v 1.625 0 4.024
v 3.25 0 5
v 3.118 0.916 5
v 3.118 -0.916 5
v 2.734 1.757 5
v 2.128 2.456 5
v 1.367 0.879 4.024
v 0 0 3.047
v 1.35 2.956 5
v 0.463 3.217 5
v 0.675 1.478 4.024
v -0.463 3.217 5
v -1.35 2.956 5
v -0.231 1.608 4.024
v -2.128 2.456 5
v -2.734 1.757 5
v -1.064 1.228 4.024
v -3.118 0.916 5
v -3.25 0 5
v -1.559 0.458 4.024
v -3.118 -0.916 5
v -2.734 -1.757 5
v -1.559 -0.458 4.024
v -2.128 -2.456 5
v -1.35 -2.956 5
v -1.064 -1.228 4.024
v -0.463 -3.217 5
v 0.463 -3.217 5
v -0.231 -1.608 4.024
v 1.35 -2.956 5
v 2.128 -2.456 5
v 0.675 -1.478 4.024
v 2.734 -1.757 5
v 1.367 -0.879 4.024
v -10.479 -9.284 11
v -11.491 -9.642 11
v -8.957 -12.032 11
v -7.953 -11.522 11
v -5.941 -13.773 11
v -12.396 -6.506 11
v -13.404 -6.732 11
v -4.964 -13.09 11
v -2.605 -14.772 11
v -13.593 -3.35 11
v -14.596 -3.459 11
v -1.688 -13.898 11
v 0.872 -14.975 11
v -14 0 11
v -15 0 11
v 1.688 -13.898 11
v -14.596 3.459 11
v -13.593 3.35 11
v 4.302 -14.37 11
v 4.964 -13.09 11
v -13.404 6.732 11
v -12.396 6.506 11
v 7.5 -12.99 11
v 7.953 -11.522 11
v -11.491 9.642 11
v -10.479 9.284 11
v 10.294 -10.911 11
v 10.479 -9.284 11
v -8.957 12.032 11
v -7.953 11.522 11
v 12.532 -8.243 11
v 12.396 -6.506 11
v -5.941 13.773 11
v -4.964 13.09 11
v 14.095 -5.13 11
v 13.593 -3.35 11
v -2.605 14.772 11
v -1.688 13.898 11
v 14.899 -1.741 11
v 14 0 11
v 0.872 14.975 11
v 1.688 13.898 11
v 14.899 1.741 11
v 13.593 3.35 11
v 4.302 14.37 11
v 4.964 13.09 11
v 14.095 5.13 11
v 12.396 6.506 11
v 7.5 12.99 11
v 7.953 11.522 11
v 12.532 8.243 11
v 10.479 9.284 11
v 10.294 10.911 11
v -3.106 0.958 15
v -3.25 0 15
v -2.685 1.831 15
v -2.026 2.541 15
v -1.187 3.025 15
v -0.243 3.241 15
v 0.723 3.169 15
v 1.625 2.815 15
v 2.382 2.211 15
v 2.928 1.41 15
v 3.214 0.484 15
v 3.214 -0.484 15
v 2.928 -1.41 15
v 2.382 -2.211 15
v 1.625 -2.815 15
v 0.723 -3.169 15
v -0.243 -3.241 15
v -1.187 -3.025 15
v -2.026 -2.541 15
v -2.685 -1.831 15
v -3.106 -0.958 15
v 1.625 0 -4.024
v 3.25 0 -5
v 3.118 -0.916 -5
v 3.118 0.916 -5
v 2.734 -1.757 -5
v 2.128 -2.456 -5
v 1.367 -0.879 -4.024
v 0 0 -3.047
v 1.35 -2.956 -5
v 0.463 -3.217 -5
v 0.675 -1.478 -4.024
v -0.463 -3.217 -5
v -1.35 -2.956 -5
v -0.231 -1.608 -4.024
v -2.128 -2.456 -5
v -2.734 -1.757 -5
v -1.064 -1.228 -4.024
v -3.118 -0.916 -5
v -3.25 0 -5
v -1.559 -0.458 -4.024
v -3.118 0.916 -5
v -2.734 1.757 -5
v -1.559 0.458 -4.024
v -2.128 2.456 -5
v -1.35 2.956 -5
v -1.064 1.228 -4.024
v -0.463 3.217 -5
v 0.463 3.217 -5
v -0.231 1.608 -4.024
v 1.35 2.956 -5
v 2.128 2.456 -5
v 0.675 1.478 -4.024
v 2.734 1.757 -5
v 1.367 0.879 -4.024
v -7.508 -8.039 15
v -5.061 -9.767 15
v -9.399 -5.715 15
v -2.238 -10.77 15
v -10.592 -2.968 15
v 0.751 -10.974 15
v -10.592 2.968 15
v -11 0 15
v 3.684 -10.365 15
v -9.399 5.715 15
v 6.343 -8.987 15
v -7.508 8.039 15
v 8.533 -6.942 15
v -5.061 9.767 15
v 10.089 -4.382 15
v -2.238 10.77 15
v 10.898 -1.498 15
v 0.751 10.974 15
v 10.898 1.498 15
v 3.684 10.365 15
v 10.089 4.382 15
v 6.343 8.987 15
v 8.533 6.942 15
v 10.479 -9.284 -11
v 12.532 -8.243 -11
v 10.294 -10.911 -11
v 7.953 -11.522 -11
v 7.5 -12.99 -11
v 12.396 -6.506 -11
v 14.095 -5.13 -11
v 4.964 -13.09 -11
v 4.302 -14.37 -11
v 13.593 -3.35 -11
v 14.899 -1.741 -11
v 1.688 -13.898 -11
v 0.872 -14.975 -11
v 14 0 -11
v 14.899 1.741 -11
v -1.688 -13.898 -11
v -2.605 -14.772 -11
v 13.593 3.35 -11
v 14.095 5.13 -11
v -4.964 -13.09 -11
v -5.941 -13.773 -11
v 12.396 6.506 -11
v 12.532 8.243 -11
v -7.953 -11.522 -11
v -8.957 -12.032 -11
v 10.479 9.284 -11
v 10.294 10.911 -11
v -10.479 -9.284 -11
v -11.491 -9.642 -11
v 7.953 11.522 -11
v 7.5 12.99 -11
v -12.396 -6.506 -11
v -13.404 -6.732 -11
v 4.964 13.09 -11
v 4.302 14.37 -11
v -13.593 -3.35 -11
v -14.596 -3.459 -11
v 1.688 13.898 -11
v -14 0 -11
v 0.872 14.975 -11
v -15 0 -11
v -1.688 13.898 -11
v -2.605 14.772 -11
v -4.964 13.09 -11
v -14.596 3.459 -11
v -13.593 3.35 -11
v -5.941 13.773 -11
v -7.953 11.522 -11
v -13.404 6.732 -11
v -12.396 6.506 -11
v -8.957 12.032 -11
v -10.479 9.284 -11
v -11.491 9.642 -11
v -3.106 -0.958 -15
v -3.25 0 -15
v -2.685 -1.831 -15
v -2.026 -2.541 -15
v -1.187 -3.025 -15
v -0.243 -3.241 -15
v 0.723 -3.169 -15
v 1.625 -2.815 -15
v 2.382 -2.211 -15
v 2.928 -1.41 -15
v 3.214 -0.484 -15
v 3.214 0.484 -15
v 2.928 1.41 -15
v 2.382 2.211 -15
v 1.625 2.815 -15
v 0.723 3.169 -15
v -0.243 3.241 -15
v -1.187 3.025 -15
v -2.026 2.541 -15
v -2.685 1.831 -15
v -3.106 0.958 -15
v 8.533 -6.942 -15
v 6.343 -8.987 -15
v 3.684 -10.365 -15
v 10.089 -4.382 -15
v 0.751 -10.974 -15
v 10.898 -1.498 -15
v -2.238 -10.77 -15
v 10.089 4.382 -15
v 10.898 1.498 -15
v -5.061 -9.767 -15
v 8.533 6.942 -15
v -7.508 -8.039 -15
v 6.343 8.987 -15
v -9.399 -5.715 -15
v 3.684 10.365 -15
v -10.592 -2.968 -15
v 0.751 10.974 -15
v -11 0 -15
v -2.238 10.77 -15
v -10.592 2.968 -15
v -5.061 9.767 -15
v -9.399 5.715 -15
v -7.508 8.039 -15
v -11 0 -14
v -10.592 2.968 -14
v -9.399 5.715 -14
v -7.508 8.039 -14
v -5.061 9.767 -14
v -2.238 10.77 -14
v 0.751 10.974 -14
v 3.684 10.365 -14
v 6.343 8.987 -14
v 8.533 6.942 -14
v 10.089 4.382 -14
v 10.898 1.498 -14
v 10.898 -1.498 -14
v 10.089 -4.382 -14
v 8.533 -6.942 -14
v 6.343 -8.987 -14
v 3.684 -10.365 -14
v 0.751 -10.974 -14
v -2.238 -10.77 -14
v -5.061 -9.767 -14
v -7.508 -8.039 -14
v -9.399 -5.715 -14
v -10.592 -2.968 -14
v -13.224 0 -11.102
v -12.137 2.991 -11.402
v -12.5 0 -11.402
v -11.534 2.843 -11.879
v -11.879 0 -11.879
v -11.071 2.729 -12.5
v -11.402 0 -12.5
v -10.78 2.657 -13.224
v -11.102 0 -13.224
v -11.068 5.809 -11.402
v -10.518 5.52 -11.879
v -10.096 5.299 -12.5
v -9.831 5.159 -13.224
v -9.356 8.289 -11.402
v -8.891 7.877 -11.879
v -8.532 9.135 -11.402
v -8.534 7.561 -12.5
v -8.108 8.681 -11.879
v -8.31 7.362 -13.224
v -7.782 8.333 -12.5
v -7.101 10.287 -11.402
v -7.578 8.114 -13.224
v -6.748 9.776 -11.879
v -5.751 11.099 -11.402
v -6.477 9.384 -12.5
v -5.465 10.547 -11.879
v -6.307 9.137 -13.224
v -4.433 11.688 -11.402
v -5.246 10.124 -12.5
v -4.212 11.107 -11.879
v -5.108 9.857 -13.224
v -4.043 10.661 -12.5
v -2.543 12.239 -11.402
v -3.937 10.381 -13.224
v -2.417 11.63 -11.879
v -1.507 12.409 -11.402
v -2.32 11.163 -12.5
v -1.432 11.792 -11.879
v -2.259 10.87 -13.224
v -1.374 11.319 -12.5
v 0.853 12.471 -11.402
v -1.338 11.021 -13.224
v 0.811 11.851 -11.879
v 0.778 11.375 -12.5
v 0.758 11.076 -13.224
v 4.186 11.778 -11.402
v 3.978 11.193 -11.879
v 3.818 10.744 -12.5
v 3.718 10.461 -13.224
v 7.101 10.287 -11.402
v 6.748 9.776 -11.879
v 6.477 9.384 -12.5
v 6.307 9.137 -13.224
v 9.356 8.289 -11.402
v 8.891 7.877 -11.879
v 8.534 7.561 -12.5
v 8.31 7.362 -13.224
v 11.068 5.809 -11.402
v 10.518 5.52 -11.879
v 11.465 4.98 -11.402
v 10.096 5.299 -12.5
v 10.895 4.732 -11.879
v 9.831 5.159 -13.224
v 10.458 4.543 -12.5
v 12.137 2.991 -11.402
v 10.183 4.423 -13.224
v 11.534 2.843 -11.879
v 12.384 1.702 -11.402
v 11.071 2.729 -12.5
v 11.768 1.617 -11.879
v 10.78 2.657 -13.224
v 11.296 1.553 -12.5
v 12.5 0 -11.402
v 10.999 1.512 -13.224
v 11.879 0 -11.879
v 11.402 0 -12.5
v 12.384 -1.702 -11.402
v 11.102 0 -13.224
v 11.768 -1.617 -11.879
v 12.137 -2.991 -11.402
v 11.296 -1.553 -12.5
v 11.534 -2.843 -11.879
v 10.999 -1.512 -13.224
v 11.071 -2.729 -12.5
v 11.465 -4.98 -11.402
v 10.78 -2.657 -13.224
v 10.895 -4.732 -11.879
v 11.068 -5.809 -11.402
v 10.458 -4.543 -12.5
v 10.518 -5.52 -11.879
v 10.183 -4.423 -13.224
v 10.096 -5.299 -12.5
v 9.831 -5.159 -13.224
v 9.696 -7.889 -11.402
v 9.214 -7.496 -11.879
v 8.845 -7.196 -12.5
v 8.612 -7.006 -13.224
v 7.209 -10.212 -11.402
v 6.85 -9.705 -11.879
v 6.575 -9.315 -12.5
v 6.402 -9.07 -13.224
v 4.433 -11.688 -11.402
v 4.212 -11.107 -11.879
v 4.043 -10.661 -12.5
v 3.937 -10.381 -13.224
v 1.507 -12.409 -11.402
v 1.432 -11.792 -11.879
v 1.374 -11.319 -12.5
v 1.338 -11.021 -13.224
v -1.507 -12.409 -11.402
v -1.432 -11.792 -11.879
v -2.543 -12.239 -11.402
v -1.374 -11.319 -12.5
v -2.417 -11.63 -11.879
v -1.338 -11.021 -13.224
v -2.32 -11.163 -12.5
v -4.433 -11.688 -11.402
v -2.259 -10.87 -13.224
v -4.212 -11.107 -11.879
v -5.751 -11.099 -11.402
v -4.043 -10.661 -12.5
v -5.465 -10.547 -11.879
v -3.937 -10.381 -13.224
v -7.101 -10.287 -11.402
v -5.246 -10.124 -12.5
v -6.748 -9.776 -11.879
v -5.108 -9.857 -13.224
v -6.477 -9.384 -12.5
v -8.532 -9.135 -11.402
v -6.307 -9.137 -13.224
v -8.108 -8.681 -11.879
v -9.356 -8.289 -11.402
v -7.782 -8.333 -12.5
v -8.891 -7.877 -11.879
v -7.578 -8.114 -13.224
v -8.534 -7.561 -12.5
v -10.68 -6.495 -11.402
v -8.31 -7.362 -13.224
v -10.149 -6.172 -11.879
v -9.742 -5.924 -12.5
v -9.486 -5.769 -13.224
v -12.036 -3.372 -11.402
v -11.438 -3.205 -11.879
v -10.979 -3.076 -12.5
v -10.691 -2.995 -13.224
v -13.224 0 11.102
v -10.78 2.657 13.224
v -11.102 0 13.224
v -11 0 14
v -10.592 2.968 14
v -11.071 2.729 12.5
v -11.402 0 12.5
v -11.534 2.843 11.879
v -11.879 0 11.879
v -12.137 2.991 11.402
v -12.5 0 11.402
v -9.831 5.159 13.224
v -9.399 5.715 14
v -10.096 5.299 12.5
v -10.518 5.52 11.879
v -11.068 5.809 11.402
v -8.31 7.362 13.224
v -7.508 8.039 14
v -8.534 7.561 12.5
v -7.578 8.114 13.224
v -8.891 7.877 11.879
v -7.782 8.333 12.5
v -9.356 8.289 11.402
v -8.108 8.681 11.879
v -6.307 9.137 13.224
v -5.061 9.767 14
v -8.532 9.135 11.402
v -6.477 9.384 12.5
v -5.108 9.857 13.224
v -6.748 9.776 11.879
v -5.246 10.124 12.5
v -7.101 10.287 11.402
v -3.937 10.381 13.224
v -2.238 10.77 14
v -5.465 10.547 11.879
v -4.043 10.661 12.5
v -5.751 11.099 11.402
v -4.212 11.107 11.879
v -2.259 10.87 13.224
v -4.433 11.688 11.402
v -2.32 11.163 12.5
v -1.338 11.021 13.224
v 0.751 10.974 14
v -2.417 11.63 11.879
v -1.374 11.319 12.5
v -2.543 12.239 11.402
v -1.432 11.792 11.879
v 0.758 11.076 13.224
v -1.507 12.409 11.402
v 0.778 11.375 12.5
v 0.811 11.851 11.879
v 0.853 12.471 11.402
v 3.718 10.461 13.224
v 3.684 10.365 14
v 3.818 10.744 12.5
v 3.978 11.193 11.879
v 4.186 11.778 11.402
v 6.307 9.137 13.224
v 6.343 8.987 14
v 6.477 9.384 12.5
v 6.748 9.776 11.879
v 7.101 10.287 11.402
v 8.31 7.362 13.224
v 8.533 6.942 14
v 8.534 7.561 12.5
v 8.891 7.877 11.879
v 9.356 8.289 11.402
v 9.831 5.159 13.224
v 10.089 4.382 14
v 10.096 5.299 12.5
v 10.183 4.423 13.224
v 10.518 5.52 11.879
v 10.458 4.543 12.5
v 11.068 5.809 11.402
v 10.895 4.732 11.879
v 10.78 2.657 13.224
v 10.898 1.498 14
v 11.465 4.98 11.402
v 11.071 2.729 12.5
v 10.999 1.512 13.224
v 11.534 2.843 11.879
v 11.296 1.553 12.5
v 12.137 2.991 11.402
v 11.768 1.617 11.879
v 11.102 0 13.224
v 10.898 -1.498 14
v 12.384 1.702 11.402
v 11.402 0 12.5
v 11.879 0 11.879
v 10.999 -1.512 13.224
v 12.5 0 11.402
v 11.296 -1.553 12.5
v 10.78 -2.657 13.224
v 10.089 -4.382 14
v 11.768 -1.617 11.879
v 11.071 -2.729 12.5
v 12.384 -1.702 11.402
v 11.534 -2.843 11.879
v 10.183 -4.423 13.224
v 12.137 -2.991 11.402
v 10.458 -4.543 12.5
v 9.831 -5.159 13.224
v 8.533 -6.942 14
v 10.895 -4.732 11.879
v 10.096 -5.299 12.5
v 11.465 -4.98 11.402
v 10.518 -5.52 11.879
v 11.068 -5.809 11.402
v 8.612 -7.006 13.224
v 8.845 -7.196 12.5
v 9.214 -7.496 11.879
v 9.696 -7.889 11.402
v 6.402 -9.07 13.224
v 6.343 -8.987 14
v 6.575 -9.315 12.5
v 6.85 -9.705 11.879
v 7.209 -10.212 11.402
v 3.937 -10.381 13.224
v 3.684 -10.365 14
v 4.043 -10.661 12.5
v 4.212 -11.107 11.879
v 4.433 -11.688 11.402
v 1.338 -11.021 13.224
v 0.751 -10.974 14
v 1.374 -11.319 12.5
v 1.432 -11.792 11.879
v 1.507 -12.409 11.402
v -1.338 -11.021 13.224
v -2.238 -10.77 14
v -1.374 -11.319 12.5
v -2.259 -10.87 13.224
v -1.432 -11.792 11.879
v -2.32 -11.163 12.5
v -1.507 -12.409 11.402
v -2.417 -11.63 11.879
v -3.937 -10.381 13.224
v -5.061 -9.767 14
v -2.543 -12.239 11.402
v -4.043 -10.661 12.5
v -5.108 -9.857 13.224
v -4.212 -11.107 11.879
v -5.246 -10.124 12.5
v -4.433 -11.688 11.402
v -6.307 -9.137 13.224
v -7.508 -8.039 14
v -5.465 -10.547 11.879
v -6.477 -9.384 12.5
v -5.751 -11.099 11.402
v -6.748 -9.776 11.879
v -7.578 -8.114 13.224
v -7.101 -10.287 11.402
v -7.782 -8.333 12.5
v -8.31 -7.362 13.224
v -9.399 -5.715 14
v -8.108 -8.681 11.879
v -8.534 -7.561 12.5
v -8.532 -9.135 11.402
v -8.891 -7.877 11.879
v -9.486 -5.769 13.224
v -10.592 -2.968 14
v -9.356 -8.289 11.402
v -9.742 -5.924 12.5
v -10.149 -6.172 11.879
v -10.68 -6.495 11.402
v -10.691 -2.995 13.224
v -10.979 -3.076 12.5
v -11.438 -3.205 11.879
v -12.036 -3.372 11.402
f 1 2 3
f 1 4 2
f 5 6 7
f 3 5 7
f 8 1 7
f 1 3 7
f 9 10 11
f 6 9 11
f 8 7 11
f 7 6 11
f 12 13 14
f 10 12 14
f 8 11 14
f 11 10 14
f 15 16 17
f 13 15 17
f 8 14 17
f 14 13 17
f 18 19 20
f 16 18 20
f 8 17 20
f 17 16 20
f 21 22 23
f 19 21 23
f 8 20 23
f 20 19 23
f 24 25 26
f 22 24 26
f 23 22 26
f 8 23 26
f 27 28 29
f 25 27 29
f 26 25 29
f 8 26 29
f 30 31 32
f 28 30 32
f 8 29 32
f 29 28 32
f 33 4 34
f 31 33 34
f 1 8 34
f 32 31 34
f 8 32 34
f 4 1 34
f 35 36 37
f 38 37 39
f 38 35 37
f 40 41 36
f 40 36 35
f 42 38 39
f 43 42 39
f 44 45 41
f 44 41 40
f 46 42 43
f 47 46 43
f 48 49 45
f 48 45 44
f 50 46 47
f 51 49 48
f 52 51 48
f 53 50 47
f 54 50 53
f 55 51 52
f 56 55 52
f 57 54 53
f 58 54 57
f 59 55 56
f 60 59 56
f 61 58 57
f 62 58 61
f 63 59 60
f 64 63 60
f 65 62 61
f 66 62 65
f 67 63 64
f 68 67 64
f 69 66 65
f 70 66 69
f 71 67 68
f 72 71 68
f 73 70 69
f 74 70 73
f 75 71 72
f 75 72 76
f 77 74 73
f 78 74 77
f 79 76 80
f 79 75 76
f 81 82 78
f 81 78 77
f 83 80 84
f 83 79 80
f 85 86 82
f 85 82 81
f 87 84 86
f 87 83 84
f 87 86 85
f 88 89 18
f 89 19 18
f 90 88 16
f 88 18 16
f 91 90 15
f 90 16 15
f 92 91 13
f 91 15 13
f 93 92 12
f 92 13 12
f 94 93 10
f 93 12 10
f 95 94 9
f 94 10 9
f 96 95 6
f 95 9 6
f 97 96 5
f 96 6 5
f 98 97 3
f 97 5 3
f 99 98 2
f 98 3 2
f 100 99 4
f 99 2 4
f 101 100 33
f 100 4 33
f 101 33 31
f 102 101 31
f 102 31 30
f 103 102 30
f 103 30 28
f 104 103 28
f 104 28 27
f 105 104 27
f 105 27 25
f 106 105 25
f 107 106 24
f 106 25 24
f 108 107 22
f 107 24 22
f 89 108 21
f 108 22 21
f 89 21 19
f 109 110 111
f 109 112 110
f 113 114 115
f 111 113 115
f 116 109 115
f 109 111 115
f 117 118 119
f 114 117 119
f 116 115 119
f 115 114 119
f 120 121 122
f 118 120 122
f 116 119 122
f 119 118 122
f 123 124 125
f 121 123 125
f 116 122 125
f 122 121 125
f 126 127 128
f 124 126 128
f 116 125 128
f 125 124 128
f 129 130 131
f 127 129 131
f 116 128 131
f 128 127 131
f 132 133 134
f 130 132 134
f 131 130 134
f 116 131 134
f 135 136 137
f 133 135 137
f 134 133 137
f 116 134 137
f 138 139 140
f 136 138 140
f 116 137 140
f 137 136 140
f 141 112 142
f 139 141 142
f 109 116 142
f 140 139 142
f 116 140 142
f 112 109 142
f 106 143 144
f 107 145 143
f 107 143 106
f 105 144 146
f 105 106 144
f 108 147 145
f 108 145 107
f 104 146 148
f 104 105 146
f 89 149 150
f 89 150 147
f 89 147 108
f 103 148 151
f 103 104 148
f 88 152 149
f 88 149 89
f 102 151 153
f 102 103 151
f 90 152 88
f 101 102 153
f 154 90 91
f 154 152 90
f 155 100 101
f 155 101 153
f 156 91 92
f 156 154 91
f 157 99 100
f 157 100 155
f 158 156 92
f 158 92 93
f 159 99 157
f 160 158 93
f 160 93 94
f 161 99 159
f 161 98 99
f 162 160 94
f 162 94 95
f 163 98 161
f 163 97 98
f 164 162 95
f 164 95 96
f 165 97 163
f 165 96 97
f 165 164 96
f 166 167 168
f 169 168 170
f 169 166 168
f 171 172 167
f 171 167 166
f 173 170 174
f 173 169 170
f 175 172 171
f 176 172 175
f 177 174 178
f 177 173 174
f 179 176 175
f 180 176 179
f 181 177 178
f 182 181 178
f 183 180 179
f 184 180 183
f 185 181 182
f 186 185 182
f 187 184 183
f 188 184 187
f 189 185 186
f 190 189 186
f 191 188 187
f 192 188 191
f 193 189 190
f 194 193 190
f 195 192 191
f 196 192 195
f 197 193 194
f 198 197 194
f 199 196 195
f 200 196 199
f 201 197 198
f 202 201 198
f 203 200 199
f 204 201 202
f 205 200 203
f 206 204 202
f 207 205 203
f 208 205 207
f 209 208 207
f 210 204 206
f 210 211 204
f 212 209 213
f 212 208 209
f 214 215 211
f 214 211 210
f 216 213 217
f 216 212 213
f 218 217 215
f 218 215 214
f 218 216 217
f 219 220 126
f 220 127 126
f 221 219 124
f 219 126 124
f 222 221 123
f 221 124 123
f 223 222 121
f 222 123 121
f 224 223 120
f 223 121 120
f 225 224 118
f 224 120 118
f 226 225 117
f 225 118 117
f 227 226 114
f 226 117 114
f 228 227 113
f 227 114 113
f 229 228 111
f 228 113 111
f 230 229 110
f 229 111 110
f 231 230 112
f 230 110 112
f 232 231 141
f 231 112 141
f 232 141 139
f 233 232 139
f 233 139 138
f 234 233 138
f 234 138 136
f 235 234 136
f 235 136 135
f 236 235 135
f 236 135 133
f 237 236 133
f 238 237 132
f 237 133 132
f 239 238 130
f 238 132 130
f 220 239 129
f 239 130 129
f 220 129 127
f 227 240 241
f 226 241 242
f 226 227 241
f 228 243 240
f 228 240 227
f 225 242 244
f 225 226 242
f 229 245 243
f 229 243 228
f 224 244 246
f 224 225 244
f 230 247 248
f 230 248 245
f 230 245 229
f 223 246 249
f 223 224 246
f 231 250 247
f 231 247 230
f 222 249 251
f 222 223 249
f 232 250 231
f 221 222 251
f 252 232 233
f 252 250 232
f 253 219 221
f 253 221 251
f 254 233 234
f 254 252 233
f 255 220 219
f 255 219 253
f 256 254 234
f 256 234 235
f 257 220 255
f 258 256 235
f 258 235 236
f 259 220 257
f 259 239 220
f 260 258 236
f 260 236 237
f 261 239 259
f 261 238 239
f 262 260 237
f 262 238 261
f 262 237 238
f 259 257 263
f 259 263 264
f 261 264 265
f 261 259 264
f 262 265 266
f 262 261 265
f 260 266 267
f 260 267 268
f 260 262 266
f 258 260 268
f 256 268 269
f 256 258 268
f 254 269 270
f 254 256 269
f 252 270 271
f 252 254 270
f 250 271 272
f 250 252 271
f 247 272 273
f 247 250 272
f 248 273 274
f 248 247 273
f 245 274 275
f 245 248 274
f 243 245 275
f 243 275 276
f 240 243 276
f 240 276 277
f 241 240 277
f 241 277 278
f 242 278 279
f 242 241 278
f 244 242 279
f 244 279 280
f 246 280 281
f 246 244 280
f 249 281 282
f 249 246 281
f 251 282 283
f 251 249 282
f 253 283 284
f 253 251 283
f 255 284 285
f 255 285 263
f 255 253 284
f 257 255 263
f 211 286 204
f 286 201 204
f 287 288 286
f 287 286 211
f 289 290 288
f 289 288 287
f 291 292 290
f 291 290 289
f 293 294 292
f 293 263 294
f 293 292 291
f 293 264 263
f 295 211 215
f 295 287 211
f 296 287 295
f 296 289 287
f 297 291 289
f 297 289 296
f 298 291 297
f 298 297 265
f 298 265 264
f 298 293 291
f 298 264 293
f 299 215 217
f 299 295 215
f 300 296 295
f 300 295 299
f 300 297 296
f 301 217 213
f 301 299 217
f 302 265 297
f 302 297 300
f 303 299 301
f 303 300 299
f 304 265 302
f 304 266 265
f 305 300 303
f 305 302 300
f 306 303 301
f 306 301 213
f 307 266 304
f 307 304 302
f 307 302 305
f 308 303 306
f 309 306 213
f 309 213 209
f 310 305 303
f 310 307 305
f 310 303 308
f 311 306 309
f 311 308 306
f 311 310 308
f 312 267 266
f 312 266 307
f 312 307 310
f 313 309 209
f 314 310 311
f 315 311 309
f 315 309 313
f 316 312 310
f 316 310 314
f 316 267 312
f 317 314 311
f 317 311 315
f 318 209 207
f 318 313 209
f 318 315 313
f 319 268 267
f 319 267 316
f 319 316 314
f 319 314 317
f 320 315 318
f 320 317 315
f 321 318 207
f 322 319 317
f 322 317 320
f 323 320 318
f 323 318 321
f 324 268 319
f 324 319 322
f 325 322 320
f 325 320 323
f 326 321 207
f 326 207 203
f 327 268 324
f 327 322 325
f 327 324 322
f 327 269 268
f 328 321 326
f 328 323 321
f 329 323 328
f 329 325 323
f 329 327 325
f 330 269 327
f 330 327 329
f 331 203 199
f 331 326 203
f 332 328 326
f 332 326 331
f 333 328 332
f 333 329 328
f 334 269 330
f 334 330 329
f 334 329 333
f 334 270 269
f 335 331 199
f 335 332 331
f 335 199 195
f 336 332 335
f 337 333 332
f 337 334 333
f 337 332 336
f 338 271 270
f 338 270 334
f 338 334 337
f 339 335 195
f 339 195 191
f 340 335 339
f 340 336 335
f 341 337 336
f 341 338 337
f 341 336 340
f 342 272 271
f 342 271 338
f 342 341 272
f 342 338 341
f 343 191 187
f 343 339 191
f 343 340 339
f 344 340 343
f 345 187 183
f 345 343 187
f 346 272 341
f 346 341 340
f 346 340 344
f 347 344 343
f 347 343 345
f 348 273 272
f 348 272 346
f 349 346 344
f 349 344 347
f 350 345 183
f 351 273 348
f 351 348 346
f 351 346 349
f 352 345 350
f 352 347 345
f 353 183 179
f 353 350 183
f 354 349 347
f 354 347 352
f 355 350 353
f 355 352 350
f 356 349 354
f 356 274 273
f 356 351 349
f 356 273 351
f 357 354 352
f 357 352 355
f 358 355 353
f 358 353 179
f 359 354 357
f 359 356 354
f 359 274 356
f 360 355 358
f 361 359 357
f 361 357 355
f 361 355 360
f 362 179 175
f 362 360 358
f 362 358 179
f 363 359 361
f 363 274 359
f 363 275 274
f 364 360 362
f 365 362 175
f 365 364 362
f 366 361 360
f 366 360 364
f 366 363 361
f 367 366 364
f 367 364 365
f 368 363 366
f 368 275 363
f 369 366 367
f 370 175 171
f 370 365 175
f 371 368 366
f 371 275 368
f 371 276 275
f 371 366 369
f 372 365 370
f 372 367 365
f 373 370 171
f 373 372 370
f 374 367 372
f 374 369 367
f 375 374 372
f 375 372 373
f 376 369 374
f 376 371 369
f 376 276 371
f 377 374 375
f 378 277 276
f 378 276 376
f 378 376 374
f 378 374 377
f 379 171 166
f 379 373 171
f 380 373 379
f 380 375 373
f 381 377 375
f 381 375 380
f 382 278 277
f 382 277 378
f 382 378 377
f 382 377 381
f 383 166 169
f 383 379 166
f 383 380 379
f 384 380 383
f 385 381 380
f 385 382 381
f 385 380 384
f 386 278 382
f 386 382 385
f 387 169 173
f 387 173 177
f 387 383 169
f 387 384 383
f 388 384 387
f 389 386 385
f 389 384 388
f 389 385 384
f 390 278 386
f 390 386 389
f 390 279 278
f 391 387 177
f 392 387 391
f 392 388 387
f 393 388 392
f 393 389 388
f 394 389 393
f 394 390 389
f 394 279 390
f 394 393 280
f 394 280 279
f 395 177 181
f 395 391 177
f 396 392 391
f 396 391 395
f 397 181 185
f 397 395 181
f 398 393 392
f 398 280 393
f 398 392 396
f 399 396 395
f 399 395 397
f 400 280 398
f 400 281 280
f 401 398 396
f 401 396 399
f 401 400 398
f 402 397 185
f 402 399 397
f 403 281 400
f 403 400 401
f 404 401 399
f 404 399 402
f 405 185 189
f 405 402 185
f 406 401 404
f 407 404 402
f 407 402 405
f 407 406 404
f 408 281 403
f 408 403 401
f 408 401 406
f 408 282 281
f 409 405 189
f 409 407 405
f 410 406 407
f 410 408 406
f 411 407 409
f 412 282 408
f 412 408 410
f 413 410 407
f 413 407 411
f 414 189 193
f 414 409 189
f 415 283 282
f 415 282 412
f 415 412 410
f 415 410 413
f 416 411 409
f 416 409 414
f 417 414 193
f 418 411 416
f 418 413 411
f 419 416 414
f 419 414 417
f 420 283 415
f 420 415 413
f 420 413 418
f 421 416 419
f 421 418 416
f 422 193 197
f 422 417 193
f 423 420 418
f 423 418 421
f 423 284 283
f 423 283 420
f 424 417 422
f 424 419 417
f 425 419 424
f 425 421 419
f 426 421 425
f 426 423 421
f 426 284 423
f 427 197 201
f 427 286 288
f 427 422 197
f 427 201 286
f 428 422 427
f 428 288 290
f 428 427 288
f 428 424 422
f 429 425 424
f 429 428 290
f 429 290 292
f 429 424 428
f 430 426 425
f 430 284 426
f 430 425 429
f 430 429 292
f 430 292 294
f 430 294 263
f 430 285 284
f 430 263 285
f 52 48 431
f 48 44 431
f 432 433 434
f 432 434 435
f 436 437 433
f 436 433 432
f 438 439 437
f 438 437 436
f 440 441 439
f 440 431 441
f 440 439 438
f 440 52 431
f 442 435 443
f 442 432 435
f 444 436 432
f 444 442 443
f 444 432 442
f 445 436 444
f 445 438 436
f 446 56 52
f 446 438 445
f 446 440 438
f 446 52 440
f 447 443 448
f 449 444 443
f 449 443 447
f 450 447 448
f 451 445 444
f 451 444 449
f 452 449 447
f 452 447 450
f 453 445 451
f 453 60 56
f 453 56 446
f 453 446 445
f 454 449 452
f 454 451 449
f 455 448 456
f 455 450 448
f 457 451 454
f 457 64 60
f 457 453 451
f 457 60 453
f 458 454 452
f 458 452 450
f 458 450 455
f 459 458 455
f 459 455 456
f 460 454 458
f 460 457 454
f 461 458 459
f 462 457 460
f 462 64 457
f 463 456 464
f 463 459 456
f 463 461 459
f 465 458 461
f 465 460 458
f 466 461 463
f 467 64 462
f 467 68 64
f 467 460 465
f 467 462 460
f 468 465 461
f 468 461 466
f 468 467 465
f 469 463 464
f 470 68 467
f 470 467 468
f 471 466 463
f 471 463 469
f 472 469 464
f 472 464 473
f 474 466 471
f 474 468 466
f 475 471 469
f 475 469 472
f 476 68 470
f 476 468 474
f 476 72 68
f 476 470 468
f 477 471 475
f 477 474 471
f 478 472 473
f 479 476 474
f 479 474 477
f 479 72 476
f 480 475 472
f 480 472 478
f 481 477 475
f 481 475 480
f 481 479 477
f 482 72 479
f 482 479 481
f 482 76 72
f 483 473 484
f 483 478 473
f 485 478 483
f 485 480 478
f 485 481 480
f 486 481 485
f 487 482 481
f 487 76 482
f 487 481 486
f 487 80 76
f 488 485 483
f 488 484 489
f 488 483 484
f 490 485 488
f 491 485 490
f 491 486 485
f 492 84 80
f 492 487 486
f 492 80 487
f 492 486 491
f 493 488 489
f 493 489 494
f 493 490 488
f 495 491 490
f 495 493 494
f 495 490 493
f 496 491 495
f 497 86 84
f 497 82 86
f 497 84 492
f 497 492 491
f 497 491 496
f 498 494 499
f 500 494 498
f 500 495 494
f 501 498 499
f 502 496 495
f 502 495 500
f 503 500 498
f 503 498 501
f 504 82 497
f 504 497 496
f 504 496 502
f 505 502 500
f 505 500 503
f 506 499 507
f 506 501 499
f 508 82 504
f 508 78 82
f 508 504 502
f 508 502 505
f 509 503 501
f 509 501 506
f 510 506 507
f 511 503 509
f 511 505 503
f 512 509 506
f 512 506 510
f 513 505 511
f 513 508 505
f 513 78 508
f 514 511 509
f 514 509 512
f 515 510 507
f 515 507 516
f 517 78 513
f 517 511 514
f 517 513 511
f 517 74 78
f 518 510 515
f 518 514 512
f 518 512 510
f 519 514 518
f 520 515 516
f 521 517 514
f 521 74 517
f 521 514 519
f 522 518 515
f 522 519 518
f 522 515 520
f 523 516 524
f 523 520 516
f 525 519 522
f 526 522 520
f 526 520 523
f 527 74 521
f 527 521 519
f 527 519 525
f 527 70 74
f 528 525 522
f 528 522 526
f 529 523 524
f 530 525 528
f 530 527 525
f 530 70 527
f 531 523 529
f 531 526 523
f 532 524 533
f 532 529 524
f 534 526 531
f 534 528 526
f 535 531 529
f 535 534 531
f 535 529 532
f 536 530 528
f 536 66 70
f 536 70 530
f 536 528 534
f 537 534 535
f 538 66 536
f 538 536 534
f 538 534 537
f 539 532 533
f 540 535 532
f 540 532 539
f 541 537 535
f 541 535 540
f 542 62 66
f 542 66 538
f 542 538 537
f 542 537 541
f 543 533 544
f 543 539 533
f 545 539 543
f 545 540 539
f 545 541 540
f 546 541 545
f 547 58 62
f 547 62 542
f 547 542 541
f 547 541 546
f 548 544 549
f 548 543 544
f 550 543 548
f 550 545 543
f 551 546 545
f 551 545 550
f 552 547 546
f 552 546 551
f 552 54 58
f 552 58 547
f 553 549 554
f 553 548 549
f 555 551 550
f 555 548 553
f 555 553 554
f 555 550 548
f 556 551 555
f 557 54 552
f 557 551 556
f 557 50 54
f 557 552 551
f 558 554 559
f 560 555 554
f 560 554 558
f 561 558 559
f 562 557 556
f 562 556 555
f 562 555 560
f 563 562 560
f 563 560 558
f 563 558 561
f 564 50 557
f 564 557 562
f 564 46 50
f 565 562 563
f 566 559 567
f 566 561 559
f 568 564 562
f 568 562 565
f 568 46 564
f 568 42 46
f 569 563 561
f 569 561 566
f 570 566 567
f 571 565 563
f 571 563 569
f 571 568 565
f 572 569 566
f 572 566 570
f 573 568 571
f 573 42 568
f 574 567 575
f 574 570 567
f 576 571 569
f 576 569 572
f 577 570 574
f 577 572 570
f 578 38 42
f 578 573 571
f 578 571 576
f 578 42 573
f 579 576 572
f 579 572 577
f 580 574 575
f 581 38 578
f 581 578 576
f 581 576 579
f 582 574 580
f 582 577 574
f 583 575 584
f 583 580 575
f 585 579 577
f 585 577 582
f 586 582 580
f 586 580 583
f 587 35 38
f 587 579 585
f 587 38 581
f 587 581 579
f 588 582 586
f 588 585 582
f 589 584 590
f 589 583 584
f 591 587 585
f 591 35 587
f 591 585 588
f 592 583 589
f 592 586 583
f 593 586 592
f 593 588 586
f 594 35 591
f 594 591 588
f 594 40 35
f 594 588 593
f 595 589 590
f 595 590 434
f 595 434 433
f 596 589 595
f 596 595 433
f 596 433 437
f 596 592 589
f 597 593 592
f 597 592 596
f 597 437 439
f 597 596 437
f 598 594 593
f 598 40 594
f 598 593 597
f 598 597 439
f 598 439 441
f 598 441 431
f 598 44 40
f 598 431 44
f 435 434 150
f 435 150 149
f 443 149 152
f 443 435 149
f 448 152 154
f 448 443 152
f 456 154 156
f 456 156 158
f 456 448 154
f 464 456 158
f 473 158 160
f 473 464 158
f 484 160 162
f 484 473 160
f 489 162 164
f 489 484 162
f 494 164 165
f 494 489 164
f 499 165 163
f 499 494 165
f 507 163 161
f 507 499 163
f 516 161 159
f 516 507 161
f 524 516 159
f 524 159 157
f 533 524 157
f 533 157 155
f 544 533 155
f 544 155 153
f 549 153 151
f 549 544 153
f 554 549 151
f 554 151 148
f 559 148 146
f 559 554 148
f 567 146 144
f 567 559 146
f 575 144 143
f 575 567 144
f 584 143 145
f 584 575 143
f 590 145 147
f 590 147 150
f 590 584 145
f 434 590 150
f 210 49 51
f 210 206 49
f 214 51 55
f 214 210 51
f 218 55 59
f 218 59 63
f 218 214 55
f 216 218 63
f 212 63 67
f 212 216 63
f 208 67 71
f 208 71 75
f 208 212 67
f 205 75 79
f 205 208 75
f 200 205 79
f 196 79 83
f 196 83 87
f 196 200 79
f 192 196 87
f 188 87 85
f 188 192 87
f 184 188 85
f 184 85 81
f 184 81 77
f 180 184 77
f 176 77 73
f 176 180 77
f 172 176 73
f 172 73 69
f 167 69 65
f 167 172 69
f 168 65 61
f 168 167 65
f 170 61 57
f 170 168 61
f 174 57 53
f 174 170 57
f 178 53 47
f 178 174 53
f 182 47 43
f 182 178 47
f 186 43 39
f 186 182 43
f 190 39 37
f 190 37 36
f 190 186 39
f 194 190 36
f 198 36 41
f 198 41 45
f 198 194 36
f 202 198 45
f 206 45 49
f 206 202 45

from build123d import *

# Parameters (mm, degrees)
F2_R           = 3
F5_D           = 6.5
F5_DEPTH       = 10
F5_TIP         = 1.9527970118
F5_ON_F3_D     = 6.5
F5_ON_F3_DEPTH = 10
F5_ON_F3_TIP   = 1.9527970118


with BuildPart() as f1:
    # F0 (on Front) → F1 (revolve)
    with BuildSketch(Plane.XZ):
        Polygon((0, -15), (0, 15), (-11, 15), (-11, 11), (-15, 11), (-15, -11), (-11, -11), (-11, -15), align=None)
    revolve(axis=Axis((0, 0, 0), (0, 0, -1)))

    # F2
    f2_edges = [f1.edges().sort_by_distance(p)[0] for p in [
        (11, 0, 11),
        (11, 0, -11),
    ]]
    fillet(f2_edges, radius=F2_R)

    # F5
    with Locations(Plane(origin=(0, 0, -15), x_dir=(1, 0, 0), z_dir=(0, 0, -1))):
        with Locations((0, 0)):
            Hole(F5_D / 2, depth=F5_DEPTH)
            with Locations((0, 0, -(F5_DEPTH + F5_TIP / 2))):  # 118° drill point
                Cone(0, F5_D / 2, F5_TIP, mode=Mode.SUBTRACT)

    # F5 on F3
    with Locations(Plane.XY.offset(15)):
        with Locations((0, 0)):
            Hole(F5_ON_F3_D / 2, depth=F5_ON_F3_DEPTH)
            with Locations((0, 0, -(F5_ON_F3_DEPTH + F5_ON_F3_TIP / 2))):  # 118° drill point
                Cone(0, F5_ON_F3_D / 2, F5_ON_F3_TIP, mode=Mode.SUBTRACT)


solid = f1.part
